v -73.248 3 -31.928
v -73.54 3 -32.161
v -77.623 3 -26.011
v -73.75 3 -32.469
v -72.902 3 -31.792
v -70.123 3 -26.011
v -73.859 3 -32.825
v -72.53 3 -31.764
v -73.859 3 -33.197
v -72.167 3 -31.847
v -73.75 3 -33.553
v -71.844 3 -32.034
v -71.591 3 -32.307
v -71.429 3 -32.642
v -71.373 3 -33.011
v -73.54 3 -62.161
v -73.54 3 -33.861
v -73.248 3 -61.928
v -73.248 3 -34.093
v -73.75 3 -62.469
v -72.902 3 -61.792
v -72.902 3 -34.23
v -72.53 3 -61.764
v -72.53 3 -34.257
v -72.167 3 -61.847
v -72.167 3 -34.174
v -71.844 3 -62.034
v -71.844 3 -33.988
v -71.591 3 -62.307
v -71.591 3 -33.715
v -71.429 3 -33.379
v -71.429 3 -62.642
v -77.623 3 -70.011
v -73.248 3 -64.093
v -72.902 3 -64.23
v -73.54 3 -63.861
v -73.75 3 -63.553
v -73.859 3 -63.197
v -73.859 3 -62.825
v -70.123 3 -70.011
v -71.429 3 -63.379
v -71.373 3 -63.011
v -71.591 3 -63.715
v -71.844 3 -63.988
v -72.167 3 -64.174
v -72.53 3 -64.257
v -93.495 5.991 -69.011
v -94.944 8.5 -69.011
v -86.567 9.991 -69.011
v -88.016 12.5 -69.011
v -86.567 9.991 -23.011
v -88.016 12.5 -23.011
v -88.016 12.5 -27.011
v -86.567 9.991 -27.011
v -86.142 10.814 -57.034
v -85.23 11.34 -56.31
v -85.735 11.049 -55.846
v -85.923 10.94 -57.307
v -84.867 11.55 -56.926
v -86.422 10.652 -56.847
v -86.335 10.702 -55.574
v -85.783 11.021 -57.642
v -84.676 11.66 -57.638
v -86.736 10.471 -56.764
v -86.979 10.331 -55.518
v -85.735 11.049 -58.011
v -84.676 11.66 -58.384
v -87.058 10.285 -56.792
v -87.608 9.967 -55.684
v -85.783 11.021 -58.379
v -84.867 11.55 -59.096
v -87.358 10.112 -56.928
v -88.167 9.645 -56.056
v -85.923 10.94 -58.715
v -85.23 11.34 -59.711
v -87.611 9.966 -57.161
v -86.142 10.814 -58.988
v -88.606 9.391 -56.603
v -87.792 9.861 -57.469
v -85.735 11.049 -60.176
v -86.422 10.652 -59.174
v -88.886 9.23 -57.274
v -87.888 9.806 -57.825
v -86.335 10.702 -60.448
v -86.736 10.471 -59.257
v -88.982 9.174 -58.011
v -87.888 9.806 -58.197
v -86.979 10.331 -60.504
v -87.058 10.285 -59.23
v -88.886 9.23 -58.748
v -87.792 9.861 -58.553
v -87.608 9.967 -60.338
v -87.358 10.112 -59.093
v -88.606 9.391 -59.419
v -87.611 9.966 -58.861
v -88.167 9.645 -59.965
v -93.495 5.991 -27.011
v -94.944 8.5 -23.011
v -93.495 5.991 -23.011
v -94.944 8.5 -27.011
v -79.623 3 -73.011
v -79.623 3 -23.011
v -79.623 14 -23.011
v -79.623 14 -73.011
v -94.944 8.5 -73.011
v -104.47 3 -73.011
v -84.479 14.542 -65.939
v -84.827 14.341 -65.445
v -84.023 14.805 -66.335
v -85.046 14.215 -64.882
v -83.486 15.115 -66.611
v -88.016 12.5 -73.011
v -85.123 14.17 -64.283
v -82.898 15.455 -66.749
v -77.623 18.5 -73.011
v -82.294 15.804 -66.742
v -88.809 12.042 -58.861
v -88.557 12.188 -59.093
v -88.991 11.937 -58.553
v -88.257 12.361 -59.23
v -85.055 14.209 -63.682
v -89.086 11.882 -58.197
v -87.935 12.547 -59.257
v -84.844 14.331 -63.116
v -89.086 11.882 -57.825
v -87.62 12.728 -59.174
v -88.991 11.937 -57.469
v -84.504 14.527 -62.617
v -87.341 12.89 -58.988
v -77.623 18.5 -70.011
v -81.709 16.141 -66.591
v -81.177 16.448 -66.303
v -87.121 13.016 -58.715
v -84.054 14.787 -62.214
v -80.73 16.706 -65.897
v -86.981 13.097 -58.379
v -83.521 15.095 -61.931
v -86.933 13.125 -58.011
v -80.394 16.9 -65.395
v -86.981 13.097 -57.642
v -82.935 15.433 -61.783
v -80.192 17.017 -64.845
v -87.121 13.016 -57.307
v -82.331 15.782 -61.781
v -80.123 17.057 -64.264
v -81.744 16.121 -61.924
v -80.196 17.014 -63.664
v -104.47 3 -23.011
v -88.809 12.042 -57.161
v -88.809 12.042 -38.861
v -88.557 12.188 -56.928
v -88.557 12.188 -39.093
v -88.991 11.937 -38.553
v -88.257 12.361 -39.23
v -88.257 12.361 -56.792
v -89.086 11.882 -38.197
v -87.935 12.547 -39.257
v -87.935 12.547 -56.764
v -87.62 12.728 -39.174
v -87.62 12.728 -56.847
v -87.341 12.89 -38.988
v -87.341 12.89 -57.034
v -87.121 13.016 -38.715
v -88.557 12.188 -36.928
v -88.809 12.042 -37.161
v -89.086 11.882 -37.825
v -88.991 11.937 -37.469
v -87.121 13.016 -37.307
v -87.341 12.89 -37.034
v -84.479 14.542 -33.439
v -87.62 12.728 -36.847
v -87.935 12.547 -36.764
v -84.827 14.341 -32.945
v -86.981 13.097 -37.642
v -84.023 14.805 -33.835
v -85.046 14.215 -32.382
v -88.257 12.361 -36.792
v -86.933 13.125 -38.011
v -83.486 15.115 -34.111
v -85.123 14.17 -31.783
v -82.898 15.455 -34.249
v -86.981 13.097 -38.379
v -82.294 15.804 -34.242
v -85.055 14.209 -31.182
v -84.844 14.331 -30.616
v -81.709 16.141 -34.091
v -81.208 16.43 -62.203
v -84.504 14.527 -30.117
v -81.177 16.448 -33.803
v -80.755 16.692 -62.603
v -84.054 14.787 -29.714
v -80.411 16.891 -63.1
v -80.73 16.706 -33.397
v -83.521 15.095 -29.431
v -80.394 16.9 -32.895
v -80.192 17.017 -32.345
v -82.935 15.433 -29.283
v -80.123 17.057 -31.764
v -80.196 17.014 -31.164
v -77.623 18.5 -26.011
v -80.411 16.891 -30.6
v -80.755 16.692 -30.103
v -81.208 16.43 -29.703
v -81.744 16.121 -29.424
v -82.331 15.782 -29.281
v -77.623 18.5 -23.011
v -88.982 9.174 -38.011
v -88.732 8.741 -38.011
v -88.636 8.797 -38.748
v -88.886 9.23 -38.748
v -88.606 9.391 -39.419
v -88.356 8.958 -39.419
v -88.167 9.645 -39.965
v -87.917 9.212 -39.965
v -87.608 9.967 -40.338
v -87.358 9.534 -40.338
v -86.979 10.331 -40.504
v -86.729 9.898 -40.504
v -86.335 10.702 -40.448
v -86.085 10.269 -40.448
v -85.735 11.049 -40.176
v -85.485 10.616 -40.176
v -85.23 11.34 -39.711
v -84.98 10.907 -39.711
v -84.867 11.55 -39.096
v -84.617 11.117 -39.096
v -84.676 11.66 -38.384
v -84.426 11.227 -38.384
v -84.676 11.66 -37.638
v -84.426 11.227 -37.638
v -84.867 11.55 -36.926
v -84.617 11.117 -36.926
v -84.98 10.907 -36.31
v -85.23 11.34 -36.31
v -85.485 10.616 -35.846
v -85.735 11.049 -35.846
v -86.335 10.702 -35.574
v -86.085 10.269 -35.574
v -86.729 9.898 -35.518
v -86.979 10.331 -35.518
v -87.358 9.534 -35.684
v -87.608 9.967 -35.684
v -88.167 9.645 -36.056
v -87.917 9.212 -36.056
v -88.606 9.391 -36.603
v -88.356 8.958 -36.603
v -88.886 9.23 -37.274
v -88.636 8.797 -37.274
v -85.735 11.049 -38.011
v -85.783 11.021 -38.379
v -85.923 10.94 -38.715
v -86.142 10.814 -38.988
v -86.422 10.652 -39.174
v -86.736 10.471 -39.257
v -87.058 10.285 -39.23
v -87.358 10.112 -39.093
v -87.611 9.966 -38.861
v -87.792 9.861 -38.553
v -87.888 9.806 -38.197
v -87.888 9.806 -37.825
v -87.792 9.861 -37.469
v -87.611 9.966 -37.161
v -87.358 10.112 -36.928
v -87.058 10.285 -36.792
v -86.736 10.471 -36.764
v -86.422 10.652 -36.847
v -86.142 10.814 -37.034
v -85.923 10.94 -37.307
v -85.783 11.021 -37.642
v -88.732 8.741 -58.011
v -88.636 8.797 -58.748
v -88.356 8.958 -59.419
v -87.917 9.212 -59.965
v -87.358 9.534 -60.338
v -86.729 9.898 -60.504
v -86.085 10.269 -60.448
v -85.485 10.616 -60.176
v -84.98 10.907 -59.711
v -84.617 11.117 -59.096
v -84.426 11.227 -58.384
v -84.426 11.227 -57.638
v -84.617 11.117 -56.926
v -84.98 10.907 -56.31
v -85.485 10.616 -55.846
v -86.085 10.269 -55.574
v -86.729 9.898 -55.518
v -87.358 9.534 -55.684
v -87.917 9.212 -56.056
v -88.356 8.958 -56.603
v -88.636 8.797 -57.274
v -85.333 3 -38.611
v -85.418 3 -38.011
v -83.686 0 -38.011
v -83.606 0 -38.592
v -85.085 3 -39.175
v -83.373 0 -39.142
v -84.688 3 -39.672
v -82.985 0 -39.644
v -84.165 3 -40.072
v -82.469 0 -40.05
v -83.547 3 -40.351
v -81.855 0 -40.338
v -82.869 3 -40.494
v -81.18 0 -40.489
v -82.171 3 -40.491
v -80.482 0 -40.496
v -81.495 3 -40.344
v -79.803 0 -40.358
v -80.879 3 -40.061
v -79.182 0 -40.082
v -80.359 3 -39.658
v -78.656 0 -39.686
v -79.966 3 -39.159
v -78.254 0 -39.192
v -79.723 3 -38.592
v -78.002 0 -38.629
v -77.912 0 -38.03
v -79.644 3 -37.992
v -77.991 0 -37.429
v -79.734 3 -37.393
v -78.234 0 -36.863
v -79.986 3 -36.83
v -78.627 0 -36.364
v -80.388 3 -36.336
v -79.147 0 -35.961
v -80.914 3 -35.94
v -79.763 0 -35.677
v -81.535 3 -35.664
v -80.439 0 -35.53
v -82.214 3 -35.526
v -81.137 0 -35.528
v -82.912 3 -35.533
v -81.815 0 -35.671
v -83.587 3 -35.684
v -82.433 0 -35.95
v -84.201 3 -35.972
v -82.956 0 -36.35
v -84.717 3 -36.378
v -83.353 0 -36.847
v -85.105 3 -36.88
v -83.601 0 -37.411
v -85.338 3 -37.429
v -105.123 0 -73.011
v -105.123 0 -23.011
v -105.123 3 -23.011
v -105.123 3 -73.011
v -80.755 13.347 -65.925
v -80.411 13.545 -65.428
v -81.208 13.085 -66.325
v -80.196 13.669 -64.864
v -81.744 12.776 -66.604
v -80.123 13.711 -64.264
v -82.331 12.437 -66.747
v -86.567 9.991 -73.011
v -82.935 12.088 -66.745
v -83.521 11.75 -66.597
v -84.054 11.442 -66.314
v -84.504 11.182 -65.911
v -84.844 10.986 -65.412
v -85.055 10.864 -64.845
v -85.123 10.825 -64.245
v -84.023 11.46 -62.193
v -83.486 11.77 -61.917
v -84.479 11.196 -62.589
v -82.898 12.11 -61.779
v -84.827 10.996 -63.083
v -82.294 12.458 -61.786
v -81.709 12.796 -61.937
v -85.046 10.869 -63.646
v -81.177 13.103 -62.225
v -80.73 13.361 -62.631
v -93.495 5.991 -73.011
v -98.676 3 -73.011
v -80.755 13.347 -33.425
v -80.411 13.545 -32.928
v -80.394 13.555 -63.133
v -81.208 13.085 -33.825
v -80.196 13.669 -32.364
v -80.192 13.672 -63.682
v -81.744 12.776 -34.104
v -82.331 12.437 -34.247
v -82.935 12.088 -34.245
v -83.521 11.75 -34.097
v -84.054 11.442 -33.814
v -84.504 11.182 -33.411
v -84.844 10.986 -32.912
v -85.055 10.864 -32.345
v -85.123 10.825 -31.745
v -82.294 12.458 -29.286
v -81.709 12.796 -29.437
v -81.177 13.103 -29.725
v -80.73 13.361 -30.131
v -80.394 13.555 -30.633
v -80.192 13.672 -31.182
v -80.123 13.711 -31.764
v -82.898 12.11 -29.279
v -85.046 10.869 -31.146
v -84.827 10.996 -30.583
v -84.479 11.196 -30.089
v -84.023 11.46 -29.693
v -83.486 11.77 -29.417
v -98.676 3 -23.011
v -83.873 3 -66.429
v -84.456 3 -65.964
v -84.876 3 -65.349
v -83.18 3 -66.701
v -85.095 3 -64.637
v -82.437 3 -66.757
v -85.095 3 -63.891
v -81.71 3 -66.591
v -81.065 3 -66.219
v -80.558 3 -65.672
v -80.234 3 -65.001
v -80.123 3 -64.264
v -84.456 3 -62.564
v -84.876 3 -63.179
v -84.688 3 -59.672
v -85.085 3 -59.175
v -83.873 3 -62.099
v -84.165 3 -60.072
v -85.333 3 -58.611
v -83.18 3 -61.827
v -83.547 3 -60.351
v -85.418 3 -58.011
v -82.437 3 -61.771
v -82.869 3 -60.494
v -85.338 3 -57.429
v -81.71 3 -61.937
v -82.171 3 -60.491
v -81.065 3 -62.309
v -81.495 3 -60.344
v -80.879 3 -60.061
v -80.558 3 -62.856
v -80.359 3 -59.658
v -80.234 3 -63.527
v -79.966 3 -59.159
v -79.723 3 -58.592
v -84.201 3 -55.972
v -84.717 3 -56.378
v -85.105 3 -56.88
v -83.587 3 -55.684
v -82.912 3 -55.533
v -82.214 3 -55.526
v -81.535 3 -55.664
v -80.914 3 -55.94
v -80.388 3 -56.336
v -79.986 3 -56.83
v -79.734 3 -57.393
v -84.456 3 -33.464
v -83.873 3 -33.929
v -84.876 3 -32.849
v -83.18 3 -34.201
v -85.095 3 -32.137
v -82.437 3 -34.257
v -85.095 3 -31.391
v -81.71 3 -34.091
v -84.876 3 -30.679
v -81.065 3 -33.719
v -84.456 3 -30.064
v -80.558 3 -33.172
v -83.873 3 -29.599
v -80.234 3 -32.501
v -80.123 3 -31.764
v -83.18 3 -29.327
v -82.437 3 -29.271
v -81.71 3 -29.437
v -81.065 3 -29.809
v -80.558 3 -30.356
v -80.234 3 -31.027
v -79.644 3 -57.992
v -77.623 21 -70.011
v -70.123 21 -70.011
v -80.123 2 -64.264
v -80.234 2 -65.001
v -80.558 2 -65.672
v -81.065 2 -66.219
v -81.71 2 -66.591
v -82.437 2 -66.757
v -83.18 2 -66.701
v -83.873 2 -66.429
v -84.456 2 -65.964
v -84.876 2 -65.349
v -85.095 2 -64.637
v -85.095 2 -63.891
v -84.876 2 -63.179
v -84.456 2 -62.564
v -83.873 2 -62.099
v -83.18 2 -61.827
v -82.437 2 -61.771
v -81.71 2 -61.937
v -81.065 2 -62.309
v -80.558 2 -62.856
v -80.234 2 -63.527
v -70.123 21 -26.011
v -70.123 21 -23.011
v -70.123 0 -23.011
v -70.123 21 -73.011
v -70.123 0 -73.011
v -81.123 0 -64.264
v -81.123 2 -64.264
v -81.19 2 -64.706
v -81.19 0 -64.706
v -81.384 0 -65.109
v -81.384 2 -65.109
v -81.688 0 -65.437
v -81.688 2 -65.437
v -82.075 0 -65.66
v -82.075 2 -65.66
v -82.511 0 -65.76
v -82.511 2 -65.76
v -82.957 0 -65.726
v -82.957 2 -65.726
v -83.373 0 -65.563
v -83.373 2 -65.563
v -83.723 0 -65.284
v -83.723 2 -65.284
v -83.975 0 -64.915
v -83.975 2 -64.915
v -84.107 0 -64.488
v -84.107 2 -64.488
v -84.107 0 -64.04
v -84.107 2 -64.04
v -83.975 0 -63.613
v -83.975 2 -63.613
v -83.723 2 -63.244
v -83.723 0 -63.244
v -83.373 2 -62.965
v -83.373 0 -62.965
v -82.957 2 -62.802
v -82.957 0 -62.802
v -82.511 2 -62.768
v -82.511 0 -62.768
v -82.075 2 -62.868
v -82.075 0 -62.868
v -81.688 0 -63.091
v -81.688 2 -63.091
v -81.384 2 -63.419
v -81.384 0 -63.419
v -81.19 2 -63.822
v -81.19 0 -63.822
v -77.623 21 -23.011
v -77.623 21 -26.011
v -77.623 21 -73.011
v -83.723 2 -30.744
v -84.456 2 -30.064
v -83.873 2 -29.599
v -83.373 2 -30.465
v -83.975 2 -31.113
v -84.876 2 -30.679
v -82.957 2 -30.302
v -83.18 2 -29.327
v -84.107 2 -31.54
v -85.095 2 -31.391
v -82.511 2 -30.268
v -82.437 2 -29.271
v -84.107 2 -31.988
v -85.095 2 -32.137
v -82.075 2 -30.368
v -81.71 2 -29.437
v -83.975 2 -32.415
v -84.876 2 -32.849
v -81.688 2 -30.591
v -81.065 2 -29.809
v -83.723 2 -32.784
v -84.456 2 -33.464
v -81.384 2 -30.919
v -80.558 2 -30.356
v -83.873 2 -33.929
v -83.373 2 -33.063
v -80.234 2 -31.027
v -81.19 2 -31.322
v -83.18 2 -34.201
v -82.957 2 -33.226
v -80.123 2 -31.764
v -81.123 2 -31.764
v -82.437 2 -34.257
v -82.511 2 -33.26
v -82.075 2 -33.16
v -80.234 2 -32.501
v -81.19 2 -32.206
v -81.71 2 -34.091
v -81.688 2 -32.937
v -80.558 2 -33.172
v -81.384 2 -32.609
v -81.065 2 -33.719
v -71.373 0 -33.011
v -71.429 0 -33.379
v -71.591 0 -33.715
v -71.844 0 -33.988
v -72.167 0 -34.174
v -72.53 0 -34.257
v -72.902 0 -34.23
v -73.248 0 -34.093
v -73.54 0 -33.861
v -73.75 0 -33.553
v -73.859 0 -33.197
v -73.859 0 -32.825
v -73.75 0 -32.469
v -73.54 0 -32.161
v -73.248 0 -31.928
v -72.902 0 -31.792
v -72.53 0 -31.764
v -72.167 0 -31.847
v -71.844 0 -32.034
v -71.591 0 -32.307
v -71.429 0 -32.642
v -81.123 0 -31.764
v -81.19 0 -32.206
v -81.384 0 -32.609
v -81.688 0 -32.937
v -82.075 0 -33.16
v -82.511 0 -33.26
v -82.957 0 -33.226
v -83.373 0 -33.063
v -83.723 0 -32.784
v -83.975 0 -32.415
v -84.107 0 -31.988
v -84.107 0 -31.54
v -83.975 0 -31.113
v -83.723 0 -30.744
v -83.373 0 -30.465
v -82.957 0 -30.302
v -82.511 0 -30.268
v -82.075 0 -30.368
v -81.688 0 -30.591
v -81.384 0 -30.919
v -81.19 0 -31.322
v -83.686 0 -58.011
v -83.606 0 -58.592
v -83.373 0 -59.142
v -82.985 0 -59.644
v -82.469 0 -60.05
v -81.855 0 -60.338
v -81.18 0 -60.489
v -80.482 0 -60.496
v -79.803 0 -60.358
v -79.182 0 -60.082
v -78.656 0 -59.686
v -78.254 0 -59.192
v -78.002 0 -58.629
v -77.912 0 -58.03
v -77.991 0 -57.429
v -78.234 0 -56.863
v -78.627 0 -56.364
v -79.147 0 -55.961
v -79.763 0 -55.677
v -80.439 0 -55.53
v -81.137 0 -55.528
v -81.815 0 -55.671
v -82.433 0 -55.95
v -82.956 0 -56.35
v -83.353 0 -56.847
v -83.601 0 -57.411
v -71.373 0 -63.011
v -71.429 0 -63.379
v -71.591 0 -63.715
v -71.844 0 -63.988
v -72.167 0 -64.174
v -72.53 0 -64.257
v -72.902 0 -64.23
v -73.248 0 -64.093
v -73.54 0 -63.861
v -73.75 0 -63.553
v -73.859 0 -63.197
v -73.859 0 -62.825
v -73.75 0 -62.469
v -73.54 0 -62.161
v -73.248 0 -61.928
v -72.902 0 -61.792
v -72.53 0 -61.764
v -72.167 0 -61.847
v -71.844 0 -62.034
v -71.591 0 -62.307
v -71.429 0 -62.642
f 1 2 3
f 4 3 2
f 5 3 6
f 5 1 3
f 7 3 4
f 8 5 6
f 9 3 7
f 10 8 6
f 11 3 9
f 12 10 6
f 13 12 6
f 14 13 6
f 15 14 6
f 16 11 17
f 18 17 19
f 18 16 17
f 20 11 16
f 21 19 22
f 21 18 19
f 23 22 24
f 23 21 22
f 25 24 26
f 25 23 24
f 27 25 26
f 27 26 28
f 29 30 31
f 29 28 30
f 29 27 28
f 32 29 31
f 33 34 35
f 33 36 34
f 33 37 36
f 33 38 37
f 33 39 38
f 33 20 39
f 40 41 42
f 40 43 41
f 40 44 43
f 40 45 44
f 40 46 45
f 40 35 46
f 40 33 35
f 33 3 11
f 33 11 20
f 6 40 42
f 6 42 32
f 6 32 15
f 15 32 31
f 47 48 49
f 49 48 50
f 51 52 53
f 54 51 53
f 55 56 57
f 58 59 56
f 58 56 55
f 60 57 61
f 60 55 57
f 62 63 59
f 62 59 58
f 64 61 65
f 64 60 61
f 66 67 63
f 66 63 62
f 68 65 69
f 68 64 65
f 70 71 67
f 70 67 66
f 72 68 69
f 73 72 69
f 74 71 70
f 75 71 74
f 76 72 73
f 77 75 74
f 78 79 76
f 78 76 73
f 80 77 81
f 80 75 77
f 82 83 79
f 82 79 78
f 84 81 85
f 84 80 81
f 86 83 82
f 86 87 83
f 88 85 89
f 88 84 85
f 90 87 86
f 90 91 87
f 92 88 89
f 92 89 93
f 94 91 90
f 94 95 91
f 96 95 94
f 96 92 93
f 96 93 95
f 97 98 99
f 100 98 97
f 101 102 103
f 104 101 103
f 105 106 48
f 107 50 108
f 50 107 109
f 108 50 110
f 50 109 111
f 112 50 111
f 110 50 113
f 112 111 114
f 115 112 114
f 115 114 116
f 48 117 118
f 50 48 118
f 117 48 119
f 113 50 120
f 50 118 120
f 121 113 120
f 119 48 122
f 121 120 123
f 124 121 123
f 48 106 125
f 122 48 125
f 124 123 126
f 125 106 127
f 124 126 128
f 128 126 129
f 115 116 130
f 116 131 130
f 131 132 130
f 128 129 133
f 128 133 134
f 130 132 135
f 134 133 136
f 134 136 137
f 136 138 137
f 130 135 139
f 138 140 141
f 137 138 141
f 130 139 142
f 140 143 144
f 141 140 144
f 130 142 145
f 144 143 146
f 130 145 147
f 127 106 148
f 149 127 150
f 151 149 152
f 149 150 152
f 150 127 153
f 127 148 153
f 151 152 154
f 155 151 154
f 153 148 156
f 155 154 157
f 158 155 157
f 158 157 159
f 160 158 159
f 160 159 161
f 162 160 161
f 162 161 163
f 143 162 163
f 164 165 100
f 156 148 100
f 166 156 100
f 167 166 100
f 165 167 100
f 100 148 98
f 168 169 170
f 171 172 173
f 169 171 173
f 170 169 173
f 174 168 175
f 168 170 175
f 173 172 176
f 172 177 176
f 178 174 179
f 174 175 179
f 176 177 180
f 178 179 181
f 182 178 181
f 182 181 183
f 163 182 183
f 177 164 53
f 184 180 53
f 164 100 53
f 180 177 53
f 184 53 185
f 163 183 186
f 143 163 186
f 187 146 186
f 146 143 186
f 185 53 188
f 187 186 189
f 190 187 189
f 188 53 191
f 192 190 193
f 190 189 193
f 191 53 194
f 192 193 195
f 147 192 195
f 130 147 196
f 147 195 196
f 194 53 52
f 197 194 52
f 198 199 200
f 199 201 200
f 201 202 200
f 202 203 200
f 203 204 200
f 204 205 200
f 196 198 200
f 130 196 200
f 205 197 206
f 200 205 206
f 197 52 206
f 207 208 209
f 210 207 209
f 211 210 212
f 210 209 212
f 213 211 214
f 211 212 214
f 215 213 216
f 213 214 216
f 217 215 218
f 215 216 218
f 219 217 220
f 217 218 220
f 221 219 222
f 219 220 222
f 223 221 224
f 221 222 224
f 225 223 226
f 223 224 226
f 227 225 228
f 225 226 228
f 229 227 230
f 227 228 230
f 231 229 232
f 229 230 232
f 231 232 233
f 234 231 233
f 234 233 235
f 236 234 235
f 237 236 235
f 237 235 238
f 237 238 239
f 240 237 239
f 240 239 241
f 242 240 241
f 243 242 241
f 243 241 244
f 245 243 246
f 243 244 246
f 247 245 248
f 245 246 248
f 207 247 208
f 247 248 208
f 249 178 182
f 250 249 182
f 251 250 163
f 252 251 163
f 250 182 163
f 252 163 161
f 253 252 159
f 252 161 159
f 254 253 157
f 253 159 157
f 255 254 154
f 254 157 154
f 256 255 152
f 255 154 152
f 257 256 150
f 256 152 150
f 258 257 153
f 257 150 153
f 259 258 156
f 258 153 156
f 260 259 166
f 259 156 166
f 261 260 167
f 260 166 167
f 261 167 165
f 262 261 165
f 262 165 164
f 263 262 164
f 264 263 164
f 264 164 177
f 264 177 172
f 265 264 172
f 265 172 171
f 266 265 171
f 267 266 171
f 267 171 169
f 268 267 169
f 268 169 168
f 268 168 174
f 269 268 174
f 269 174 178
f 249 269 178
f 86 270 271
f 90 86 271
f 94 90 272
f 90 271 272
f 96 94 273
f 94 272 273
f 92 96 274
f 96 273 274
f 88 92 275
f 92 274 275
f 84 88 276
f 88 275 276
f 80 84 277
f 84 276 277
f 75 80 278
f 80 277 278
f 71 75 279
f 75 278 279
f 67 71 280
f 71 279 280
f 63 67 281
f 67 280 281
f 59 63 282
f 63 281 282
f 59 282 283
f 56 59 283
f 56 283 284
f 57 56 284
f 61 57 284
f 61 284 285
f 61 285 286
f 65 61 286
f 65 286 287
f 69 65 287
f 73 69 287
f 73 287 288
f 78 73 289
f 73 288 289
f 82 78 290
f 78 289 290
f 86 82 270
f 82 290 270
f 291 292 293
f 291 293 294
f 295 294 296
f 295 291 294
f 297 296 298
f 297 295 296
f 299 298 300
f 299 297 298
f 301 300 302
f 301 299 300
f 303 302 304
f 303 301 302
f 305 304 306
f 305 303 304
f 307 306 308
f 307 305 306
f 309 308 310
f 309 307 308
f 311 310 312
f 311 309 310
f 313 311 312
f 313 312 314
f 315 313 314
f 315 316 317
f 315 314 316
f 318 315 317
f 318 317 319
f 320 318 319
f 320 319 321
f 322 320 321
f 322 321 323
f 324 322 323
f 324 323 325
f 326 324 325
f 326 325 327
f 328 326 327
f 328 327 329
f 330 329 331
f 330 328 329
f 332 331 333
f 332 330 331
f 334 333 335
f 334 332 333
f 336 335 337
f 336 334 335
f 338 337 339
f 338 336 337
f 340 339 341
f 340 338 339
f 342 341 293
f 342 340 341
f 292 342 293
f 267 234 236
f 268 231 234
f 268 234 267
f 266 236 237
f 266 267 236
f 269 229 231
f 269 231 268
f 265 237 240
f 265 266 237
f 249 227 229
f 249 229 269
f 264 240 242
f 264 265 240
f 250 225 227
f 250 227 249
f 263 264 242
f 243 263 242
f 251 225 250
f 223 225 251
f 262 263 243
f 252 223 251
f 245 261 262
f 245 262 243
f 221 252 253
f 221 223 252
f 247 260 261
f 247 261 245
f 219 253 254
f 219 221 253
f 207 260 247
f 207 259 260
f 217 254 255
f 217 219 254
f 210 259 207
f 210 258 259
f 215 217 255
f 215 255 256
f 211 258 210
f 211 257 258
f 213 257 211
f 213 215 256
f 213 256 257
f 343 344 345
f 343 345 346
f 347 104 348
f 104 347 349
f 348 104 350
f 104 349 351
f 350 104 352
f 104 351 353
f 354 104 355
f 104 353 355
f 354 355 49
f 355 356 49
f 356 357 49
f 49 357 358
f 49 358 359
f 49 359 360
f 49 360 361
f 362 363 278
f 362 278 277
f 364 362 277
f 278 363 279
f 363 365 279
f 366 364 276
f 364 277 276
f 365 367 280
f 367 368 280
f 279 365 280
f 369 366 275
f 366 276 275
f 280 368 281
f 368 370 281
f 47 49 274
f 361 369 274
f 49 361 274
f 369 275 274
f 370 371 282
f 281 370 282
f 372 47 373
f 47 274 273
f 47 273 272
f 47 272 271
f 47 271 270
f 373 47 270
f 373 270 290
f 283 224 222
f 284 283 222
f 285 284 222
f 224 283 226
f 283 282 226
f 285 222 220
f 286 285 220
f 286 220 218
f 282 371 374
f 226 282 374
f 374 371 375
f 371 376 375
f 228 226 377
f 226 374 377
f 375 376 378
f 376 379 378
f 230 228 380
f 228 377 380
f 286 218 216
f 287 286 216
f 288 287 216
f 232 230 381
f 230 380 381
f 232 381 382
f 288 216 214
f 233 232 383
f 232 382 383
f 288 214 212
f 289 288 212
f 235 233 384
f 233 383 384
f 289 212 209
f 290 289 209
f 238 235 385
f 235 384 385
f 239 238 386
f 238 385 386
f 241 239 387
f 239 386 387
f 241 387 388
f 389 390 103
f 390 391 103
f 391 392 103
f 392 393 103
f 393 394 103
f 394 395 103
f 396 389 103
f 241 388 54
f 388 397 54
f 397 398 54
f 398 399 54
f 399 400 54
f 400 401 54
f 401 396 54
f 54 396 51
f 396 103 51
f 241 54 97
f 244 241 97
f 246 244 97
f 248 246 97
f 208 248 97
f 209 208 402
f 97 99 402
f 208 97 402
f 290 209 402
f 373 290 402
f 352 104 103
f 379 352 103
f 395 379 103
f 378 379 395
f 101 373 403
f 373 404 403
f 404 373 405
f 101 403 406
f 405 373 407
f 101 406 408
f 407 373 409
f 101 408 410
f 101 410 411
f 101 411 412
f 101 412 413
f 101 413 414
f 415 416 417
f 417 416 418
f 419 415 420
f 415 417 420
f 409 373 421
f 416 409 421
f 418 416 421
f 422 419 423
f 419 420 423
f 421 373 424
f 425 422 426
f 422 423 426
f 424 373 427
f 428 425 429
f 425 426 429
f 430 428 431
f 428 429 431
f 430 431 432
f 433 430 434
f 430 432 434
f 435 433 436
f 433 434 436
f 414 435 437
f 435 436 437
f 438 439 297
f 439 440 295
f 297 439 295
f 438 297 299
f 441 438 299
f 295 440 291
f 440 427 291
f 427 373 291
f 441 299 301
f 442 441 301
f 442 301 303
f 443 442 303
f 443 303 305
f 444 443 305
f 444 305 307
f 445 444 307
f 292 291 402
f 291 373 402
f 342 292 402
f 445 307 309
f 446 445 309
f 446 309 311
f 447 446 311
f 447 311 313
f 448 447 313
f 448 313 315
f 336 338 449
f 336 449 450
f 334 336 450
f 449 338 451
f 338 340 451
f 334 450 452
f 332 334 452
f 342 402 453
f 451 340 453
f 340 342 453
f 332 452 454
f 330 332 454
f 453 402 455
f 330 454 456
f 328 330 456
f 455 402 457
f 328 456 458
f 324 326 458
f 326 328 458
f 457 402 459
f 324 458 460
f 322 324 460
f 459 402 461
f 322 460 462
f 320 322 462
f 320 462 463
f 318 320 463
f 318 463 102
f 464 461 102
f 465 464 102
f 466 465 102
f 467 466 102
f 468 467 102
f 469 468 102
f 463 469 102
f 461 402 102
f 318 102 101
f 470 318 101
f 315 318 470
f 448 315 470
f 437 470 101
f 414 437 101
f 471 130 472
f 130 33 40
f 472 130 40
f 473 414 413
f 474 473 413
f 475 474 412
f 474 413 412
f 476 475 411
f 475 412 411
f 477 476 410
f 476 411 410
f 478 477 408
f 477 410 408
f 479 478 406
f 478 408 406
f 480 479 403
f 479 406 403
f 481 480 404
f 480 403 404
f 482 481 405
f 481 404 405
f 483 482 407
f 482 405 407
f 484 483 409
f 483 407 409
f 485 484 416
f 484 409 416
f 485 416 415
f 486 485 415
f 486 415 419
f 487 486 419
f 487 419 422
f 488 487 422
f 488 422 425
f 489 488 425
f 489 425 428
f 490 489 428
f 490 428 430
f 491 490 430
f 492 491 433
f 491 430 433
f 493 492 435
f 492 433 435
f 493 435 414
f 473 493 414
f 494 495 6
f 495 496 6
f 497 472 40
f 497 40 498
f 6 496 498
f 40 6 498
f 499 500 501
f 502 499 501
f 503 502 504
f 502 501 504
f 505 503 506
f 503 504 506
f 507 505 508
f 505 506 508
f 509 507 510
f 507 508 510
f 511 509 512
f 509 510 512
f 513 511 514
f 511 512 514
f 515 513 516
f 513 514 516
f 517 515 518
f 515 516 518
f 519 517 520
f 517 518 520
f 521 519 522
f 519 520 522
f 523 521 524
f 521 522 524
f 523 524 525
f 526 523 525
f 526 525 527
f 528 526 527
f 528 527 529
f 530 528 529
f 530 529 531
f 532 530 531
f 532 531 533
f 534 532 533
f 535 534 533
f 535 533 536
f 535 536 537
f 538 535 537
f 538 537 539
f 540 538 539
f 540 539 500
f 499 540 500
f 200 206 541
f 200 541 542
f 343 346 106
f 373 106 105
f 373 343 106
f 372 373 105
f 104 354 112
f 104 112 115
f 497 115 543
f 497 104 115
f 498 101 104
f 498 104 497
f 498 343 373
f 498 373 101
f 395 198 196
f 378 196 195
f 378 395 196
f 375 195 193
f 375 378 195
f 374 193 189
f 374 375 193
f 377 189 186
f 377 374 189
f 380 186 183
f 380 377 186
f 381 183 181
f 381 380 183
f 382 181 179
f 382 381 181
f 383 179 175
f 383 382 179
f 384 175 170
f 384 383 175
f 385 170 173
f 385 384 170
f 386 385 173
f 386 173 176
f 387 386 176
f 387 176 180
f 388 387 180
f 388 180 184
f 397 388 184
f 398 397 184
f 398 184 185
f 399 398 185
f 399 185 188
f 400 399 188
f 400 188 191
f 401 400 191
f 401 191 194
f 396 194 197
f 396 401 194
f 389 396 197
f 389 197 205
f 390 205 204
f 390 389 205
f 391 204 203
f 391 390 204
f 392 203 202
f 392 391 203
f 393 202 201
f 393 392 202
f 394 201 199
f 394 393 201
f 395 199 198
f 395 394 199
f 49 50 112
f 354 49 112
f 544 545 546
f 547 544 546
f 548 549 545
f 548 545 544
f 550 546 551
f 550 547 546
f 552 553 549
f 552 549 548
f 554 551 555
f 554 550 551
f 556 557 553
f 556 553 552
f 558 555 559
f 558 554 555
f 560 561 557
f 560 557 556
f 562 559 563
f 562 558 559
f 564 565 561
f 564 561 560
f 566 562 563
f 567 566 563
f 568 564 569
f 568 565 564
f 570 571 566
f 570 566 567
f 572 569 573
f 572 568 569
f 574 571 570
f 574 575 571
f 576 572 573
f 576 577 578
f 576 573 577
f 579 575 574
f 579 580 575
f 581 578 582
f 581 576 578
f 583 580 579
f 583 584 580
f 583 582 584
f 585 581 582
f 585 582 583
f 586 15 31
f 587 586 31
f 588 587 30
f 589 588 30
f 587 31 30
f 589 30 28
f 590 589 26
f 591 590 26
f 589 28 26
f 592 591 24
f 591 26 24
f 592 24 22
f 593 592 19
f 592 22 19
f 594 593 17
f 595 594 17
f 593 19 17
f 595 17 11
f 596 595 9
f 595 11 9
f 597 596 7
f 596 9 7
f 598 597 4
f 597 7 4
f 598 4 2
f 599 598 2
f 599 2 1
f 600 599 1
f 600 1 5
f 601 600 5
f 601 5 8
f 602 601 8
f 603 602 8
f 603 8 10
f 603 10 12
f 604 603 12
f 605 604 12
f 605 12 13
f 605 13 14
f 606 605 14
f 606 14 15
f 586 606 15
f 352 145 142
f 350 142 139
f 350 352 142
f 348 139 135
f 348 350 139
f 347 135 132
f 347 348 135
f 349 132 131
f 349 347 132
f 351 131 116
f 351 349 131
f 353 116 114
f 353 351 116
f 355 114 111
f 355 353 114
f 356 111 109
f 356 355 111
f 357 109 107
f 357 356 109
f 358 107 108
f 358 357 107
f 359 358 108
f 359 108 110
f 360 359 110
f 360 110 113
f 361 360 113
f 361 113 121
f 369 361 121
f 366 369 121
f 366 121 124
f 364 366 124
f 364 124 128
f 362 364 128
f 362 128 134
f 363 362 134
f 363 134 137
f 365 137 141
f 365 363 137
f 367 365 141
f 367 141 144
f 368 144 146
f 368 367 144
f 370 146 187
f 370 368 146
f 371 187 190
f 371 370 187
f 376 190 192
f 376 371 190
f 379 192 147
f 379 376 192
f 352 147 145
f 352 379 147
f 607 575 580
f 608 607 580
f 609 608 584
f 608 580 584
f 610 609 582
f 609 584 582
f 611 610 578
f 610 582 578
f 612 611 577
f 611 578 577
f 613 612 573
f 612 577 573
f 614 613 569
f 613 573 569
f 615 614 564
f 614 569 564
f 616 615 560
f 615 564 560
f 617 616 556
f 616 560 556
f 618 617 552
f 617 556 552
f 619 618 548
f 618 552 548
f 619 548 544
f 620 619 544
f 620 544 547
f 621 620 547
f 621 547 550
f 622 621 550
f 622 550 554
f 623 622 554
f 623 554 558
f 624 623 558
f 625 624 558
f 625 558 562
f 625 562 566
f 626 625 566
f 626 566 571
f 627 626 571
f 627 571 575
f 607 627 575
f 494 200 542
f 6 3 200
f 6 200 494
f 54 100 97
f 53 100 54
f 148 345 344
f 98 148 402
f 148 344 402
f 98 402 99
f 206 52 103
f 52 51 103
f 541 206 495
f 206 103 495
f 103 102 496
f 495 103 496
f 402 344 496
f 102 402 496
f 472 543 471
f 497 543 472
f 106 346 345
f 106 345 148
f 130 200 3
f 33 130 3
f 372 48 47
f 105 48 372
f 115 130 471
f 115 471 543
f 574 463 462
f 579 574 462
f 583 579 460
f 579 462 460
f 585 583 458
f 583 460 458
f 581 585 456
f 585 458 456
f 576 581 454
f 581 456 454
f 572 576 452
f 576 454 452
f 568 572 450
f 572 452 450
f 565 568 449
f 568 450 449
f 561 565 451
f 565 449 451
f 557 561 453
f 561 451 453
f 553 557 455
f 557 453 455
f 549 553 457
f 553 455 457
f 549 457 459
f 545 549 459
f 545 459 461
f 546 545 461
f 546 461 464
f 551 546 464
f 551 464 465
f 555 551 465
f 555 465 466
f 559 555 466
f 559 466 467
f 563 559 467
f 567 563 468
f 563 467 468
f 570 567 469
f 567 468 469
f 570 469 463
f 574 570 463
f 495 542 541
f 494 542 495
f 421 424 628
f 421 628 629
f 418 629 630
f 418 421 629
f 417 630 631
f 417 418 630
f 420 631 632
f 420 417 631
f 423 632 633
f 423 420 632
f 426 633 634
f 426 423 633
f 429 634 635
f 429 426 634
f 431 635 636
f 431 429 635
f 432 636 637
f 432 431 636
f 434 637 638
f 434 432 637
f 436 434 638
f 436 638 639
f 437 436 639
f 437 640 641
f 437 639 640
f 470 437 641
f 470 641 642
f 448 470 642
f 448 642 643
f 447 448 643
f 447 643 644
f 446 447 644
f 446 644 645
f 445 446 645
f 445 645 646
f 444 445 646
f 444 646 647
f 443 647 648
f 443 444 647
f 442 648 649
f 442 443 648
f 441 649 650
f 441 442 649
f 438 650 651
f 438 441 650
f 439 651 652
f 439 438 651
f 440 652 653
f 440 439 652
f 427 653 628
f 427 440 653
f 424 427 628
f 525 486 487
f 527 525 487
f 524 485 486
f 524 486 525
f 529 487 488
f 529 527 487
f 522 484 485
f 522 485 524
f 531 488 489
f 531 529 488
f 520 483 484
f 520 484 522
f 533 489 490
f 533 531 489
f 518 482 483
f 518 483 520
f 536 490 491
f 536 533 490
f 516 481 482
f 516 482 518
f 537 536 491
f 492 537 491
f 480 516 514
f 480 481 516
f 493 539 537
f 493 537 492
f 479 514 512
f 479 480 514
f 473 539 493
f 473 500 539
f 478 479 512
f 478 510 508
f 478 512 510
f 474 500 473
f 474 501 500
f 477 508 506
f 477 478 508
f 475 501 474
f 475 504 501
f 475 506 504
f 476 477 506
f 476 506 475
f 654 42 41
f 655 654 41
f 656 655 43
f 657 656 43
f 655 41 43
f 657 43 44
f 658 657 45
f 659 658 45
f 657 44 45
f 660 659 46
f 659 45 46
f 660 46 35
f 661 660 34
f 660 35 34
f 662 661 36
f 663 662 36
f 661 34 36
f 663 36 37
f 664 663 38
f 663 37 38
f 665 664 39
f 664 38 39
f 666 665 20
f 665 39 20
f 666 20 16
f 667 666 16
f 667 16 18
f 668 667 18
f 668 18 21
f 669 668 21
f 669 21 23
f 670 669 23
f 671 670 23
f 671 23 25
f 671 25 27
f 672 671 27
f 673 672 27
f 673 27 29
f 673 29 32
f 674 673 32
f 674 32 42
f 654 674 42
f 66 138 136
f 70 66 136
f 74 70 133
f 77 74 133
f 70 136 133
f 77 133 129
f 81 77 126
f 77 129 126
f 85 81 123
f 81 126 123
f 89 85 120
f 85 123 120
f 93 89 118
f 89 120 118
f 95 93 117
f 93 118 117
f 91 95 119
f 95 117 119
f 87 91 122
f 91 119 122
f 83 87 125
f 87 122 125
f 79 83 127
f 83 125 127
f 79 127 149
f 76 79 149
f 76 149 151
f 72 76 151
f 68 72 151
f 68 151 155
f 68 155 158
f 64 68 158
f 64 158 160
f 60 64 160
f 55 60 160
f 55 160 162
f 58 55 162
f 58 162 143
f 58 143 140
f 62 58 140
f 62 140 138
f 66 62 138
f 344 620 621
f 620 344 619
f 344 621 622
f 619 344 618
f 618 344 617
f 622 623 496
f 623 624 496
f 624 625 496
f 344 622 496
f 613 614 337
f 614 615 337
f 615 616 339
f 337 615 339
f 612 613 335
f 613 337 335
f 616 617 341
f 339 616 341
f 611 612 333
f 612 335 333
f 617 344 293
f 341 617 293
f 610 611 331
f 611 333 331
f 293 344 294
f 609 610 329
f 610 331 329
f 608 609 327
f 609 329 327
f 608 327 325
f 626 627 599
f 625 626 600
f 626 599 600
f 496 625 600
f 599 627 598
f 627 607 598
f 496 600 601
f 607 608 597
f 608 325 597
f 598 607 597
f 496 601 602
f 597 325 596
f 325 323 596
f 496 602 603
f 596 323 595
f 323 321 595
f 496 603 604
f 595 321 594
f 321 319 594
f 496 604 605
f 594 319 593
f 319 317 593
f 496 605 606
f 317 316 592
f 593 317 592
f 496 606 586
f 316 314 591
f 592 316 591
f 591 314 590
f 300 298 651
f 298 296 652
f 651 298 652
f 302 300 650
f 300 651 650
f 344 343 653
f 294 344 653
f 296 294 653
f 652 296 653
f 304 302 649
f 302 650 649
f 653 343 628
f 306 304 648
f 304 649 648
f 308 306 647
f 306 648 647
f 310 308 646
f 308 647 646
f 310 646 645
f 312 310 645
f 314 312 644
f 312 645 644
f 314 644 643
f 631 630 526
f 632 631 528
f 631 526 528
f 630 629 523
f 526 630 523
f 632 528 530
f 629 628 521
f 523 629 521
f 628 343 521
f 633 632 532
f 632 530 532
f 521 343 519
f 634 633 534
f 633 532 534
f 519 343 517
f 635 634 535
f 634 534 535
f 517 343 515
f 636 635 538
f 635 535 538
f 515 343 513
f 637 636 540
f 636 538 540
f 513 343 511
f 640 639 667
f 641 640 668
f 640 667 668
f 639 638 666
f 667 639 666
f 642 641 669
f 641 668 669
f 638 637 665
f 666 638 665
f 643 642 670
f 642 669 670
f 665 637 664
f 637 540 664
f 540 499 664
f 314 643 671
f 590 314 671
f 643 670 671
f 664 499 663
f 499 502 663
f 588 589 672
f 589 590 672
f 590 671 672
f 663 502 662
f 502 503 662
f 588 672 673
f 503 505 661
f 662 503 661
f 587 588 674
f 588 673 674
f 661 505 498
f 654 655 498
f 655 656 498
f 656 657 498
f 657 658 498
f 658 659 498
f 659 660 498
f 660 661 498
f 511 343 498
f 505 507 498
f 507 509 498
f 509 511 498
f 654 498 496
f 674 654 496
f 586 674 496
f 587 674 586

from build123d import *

# Parameters (mm, degrees)
SKETCH1_W                      = 35
SKETCH1_H                      = 50
BOSS_EXTRUDE1_DEPTH            = 3
SKETCH2_R                      = 1.5
SKETCH2_R_2                    = 1.25
CUT_EXTRUDE1_DEPTH             = 4
BOSS_EXTRUDE2_DEPTH            = 50
CUT_EXTRUDE5_DEPTH             = 51
SKETCH8_R                      = 2.5
CUT_EXTRUDE6_DEPTH             = 16.5
CUT_EXTRUDE6_DEPTH_BACK        = 1
CUT_EXTRUDE7_REACH             = 21.771
SKETCH9_R                      = 1.25
SKETCH10_R                     = 2.5
CUT_EXTRUDE8_DEPTH             = 0.5
CUT_EXTRUDE8_DIRECTION_2_REACH = 18.874
SKETCH11_W                     = 7.5
SKETCH11_H                     = 3
BOSS_EXTRUDE3_DEPTH            = 18
CUT_EXTRUDE9_REACH             = 21.771
SKETCH14_W                     = 8
SKETCH14_H                     = 4


with BuildPart() as part:
    # Sketch1 → Boss-Extrude1 (new body)
    with BuildSketch(Plane(origin=(0, 0, 0), x_dir=(1, 0, 0), z_dir=(0, 1, 0))):
        with Locations((-87.623418825, 48.010907537)):
            Rectangle(SKETCH1_W, SKETCH1_H)
    extrude(amount=BOSS_EXTRUDE1_DEPTH)

    # Sketch2 → Cut-Extrude1 (cut, through all)
    with BuildSketch(Plane(origin=(0, 3, 0), x_dir=(1, 0, 0), z_dir=(0, 1, 0))):
        with Locations((-82.623418825, 64.263988227)):
            Circle(SKETCH2_R)
        with Locations((-82.623418825, 31.763988227)):
            Circle(SKETCH2_R)
        with Locations((-72.623418825, 33.010907537)):
            Circle(SKETCH2_R_2)
        with Locations((-72.623418825, 63.010907537)):
            Circle(SKETCH2_R_2)
    extrude(amount=-CUT_EXTRUDE1_DEPTH, mode=Mode.SUBTRACT)

    # Sketch4 → Boss-Extrude2 (add)
    with BuildSketch(Plane.XY.offset(-23.010907537)):
        Polygon((-77.623418825, 3), (-104.470206342, 3), (-77.623418825, 18.5), align=None)
    extrude(amount=-BOSS_EXTRUDE2_DEPTH)

    # Sketch6 → Cut-Extrude5 (cut, through all)
    with BuildSketch(Plane.XY.offset(-23.010907537)):
        Polygon((-98.675977708, 3), (-79.623418825, 3), (-79.623418825, 14), align=None)
    extrude(amount=-CUT_EXTRUDE5_DEPTH, mode=Mode.SUBTRACT)

    # Sketch8 → Cut-Extrude6 (cut, two sides)
    with BuildSketch(Plane(origin=(0, 3, 0), x_dir=(1, 0, 0), z_dir=(0, 1, 0))) as cut_extrude6_sk:
        with Locations((-82.623418825, 31.763988227)):
            Circle(SKETCH8_R)
        with Locations((-82.623418825, 64.263988227)):
            Circle(SKETCH8_R)
    extrude(amount=CUT_EXTRUDE6_DEPTH, mode=Mode.SUBTRACT)
    extrude(cut_extrude6_sk.sketch, amount=-CUT_EXTRUDE6_DEPTH_BACK, mode=Mode.SUBTRACT)

    # Sketch9 → Cut-Extrude7 (cut, up to next)
    with BuildSketch(Plane(origin=(-27.416589691, 47.486926315, 0), x_dir=(0.866025404, 0.5, 0), z_dir=(-0.5, 0.866025404, 0)), mode=Mode.PRIVATE) as cut_extrude7_sk1:
        with Locations((-69.973852631, 58.010907537)):
            Circle(SKETCH9_R)
    cut_extrude7_tool1 = extrude(cut_extrude7_sk1.sketch, amount=-CUT_EXTRUDE7_REACH, mode=Mode.PRIVATE) & part.part
    add(cut_extrude7_tool1.solids().sort_by_distance((-88.015724, 12.5, -58.010908))[0], mode=Mode.SUBTRACT)
    # Sketch9 → Cut-Extrude7 (cut, up to next)
    with BuildSketch(Plane(origin=(-27.416589691, 47.486926315, 0), x_dir=(0.866025404, 0.5, 0), z_dir=(-0.5, 0.866025404, 0)), mode=Mode.PRIVATE) as cut_extrude7_sk2:
        with Locations((-69.973852631, 38.010907537)):
            Circle(SKETCH9_R)
    cut_extrude7_tool2 = extrude(cut_extrude7_sk2.sketch, amount=-CUT_EXTRUDE7_REACH, mode=Mode.PRIVATE) & part.part
    add(cut_extrude7_tool2.solids().sort_by_distance((-88.015724, 12.5, -38.010908))[0], mode=Mode.SUBTRACT)

    # Sketch10 → Cut-Extrude8 (cut)
    with BuildSketch(Plane(origin=(-25.968032533, 44.977951719, 0), x_dir=(-0.866025404, -0.5, 0), z_dir=(0.5, -0.866025404, 0))):
        with Locations((69.973852631, 58.010907537)):
            Circle(SKETCH10_R)
        with Locations((69.973852631, 38.010907537)):
            Circle(SKETCH10_R)
    extrude(amount=-CUT_EXTRUDE8_DEPTH, mode=Mode.SUBTRACT)

    # Sketch10 → Cut-Extrude8 direction 2 (cut, up to next)
    with BuildSketch(Plane(origin=(-25.968032533, 44.977951719, 0), x_dir=(-0.866025404, -0.5, 0), z_dir=(0.5, -0.866025404, 0)), mode=Mode.PRIVATE) as cut_extrude8_direction_2_sk1:
        with Locations((69.973852631, 58.010907537)):
            Circle(SKETCH10_R)
    cut_extrude8_direction_2_tool1 = extrude(cut_extrude8_direction_2_sk1.sketch, amount=CUT_EXTRUDE8_DIRECTION_2_REACH, mode=Mode.PRIVATE) & part.part
    add(cut_extrude8_direction_2_tool1.solids().sort_by_distance((-86.567167, 9.991025, -58.010908))[0], mode=Mode.SUBTRACT)
    # Sketch10 → Cut-Extrude8 direction 2 (cut, up to next)
    with BuildSketch(Plane(origin=(-25.968032533, 44.977951719, 0), x_dir=(-0.866025404, -0.5, 0), z_dir=(0.5, -0.866025404, 0)), mode=Mode.PRIVATE) as cut_extrude8_direction_2_sk2:
        with Locations((69.973852631, 38.010907537)):
            Circle(SKETCH10_R)
    cut_extrude8_direction_2_tool2 = extrude(cut_extrude8_direction_2_sk2.sketch, amount=CUT_EXTRUDE8_DIRECTION_2_REACH, mode=Mode.PRIVATE) & part.part
    add(cut_extrude8_direction_2_tool2.solids().sort_by_distance((-86.567167, 9.991025, -38.010908))[0], mode=Mode.SUBTRACT)

    # Sketch11 → Boss-Extrude3 (add)
    with BuildSketch(Plane(origin=(0, 3, 0), x_dir=(1, 0, 0), z_dir=(0, 1, 0))):
        with Locations((-73.873418825, 24.510907537)):
            Rectangle(SKETCH11_W, SKETCH11_H)
        with Locations((-73.873418825, 71.510907537)):
            Rectangle(SKETCH11_W, SKETCH11_H)
    extrude(amount=BOSS_EXTRUDE3_DEPTH)

    # Sketch14 → Cut-Extrude9 (cut, up to next)
    with BuildSketch(Plane(origin=(-27.416589691, 47.486926315, 0), x_dir=(0.866025404, 0.5, 0), z_dir=(-0.5, 0.866025404, 0)), mode=Mode.PRIVATE) as cut_extrude9_sk1:
        with Locations((-73.973852631, 25.010907537)):
            Rectangle(SKETCH14_W, SKETCH14_H)
    cut_extrude9_tool1 = extrude(cut_extrude9_sk1.sketch, amount=-CUT_EXTRUDE9_REACH, mode=Mode.PRIVATE) & part.part
    add(cut_extrude9_tool1.solids().sort_by_distance((-91.479825, 10.5, -25.010908))[0], mode=Mode.SUBTRACT)
    # Sketch14 → Cut-Extrude9 (cut, up to next)
    with BuildSketch(Plane(origin=(-27.416589691, 47.486926315, 0), x_dir=(0.866025404, 0.5, 0), z_dir=(-0.5, 0.866025404, 0)), mode=Mode.PRIVATE) as cut_extrude9_sk2:
        with Locations((-73.973852631, 71.010907537)):
            Rectangle(SKETCH14_W, SKETCH14_H)
    cut_extrude9_tool2 = extrude(cut_extrude9_sk2.sketch, amount=-CUT_EXTRUDE9_REACH, mode=Mode.PRIVATE) & part.part
    add(cut_extrude9_tool2.solids().sort_by_distance((-91.479825, 10.5, -71.010908))[0], mode=Mode.SUBTRACT)


solid = part.part
